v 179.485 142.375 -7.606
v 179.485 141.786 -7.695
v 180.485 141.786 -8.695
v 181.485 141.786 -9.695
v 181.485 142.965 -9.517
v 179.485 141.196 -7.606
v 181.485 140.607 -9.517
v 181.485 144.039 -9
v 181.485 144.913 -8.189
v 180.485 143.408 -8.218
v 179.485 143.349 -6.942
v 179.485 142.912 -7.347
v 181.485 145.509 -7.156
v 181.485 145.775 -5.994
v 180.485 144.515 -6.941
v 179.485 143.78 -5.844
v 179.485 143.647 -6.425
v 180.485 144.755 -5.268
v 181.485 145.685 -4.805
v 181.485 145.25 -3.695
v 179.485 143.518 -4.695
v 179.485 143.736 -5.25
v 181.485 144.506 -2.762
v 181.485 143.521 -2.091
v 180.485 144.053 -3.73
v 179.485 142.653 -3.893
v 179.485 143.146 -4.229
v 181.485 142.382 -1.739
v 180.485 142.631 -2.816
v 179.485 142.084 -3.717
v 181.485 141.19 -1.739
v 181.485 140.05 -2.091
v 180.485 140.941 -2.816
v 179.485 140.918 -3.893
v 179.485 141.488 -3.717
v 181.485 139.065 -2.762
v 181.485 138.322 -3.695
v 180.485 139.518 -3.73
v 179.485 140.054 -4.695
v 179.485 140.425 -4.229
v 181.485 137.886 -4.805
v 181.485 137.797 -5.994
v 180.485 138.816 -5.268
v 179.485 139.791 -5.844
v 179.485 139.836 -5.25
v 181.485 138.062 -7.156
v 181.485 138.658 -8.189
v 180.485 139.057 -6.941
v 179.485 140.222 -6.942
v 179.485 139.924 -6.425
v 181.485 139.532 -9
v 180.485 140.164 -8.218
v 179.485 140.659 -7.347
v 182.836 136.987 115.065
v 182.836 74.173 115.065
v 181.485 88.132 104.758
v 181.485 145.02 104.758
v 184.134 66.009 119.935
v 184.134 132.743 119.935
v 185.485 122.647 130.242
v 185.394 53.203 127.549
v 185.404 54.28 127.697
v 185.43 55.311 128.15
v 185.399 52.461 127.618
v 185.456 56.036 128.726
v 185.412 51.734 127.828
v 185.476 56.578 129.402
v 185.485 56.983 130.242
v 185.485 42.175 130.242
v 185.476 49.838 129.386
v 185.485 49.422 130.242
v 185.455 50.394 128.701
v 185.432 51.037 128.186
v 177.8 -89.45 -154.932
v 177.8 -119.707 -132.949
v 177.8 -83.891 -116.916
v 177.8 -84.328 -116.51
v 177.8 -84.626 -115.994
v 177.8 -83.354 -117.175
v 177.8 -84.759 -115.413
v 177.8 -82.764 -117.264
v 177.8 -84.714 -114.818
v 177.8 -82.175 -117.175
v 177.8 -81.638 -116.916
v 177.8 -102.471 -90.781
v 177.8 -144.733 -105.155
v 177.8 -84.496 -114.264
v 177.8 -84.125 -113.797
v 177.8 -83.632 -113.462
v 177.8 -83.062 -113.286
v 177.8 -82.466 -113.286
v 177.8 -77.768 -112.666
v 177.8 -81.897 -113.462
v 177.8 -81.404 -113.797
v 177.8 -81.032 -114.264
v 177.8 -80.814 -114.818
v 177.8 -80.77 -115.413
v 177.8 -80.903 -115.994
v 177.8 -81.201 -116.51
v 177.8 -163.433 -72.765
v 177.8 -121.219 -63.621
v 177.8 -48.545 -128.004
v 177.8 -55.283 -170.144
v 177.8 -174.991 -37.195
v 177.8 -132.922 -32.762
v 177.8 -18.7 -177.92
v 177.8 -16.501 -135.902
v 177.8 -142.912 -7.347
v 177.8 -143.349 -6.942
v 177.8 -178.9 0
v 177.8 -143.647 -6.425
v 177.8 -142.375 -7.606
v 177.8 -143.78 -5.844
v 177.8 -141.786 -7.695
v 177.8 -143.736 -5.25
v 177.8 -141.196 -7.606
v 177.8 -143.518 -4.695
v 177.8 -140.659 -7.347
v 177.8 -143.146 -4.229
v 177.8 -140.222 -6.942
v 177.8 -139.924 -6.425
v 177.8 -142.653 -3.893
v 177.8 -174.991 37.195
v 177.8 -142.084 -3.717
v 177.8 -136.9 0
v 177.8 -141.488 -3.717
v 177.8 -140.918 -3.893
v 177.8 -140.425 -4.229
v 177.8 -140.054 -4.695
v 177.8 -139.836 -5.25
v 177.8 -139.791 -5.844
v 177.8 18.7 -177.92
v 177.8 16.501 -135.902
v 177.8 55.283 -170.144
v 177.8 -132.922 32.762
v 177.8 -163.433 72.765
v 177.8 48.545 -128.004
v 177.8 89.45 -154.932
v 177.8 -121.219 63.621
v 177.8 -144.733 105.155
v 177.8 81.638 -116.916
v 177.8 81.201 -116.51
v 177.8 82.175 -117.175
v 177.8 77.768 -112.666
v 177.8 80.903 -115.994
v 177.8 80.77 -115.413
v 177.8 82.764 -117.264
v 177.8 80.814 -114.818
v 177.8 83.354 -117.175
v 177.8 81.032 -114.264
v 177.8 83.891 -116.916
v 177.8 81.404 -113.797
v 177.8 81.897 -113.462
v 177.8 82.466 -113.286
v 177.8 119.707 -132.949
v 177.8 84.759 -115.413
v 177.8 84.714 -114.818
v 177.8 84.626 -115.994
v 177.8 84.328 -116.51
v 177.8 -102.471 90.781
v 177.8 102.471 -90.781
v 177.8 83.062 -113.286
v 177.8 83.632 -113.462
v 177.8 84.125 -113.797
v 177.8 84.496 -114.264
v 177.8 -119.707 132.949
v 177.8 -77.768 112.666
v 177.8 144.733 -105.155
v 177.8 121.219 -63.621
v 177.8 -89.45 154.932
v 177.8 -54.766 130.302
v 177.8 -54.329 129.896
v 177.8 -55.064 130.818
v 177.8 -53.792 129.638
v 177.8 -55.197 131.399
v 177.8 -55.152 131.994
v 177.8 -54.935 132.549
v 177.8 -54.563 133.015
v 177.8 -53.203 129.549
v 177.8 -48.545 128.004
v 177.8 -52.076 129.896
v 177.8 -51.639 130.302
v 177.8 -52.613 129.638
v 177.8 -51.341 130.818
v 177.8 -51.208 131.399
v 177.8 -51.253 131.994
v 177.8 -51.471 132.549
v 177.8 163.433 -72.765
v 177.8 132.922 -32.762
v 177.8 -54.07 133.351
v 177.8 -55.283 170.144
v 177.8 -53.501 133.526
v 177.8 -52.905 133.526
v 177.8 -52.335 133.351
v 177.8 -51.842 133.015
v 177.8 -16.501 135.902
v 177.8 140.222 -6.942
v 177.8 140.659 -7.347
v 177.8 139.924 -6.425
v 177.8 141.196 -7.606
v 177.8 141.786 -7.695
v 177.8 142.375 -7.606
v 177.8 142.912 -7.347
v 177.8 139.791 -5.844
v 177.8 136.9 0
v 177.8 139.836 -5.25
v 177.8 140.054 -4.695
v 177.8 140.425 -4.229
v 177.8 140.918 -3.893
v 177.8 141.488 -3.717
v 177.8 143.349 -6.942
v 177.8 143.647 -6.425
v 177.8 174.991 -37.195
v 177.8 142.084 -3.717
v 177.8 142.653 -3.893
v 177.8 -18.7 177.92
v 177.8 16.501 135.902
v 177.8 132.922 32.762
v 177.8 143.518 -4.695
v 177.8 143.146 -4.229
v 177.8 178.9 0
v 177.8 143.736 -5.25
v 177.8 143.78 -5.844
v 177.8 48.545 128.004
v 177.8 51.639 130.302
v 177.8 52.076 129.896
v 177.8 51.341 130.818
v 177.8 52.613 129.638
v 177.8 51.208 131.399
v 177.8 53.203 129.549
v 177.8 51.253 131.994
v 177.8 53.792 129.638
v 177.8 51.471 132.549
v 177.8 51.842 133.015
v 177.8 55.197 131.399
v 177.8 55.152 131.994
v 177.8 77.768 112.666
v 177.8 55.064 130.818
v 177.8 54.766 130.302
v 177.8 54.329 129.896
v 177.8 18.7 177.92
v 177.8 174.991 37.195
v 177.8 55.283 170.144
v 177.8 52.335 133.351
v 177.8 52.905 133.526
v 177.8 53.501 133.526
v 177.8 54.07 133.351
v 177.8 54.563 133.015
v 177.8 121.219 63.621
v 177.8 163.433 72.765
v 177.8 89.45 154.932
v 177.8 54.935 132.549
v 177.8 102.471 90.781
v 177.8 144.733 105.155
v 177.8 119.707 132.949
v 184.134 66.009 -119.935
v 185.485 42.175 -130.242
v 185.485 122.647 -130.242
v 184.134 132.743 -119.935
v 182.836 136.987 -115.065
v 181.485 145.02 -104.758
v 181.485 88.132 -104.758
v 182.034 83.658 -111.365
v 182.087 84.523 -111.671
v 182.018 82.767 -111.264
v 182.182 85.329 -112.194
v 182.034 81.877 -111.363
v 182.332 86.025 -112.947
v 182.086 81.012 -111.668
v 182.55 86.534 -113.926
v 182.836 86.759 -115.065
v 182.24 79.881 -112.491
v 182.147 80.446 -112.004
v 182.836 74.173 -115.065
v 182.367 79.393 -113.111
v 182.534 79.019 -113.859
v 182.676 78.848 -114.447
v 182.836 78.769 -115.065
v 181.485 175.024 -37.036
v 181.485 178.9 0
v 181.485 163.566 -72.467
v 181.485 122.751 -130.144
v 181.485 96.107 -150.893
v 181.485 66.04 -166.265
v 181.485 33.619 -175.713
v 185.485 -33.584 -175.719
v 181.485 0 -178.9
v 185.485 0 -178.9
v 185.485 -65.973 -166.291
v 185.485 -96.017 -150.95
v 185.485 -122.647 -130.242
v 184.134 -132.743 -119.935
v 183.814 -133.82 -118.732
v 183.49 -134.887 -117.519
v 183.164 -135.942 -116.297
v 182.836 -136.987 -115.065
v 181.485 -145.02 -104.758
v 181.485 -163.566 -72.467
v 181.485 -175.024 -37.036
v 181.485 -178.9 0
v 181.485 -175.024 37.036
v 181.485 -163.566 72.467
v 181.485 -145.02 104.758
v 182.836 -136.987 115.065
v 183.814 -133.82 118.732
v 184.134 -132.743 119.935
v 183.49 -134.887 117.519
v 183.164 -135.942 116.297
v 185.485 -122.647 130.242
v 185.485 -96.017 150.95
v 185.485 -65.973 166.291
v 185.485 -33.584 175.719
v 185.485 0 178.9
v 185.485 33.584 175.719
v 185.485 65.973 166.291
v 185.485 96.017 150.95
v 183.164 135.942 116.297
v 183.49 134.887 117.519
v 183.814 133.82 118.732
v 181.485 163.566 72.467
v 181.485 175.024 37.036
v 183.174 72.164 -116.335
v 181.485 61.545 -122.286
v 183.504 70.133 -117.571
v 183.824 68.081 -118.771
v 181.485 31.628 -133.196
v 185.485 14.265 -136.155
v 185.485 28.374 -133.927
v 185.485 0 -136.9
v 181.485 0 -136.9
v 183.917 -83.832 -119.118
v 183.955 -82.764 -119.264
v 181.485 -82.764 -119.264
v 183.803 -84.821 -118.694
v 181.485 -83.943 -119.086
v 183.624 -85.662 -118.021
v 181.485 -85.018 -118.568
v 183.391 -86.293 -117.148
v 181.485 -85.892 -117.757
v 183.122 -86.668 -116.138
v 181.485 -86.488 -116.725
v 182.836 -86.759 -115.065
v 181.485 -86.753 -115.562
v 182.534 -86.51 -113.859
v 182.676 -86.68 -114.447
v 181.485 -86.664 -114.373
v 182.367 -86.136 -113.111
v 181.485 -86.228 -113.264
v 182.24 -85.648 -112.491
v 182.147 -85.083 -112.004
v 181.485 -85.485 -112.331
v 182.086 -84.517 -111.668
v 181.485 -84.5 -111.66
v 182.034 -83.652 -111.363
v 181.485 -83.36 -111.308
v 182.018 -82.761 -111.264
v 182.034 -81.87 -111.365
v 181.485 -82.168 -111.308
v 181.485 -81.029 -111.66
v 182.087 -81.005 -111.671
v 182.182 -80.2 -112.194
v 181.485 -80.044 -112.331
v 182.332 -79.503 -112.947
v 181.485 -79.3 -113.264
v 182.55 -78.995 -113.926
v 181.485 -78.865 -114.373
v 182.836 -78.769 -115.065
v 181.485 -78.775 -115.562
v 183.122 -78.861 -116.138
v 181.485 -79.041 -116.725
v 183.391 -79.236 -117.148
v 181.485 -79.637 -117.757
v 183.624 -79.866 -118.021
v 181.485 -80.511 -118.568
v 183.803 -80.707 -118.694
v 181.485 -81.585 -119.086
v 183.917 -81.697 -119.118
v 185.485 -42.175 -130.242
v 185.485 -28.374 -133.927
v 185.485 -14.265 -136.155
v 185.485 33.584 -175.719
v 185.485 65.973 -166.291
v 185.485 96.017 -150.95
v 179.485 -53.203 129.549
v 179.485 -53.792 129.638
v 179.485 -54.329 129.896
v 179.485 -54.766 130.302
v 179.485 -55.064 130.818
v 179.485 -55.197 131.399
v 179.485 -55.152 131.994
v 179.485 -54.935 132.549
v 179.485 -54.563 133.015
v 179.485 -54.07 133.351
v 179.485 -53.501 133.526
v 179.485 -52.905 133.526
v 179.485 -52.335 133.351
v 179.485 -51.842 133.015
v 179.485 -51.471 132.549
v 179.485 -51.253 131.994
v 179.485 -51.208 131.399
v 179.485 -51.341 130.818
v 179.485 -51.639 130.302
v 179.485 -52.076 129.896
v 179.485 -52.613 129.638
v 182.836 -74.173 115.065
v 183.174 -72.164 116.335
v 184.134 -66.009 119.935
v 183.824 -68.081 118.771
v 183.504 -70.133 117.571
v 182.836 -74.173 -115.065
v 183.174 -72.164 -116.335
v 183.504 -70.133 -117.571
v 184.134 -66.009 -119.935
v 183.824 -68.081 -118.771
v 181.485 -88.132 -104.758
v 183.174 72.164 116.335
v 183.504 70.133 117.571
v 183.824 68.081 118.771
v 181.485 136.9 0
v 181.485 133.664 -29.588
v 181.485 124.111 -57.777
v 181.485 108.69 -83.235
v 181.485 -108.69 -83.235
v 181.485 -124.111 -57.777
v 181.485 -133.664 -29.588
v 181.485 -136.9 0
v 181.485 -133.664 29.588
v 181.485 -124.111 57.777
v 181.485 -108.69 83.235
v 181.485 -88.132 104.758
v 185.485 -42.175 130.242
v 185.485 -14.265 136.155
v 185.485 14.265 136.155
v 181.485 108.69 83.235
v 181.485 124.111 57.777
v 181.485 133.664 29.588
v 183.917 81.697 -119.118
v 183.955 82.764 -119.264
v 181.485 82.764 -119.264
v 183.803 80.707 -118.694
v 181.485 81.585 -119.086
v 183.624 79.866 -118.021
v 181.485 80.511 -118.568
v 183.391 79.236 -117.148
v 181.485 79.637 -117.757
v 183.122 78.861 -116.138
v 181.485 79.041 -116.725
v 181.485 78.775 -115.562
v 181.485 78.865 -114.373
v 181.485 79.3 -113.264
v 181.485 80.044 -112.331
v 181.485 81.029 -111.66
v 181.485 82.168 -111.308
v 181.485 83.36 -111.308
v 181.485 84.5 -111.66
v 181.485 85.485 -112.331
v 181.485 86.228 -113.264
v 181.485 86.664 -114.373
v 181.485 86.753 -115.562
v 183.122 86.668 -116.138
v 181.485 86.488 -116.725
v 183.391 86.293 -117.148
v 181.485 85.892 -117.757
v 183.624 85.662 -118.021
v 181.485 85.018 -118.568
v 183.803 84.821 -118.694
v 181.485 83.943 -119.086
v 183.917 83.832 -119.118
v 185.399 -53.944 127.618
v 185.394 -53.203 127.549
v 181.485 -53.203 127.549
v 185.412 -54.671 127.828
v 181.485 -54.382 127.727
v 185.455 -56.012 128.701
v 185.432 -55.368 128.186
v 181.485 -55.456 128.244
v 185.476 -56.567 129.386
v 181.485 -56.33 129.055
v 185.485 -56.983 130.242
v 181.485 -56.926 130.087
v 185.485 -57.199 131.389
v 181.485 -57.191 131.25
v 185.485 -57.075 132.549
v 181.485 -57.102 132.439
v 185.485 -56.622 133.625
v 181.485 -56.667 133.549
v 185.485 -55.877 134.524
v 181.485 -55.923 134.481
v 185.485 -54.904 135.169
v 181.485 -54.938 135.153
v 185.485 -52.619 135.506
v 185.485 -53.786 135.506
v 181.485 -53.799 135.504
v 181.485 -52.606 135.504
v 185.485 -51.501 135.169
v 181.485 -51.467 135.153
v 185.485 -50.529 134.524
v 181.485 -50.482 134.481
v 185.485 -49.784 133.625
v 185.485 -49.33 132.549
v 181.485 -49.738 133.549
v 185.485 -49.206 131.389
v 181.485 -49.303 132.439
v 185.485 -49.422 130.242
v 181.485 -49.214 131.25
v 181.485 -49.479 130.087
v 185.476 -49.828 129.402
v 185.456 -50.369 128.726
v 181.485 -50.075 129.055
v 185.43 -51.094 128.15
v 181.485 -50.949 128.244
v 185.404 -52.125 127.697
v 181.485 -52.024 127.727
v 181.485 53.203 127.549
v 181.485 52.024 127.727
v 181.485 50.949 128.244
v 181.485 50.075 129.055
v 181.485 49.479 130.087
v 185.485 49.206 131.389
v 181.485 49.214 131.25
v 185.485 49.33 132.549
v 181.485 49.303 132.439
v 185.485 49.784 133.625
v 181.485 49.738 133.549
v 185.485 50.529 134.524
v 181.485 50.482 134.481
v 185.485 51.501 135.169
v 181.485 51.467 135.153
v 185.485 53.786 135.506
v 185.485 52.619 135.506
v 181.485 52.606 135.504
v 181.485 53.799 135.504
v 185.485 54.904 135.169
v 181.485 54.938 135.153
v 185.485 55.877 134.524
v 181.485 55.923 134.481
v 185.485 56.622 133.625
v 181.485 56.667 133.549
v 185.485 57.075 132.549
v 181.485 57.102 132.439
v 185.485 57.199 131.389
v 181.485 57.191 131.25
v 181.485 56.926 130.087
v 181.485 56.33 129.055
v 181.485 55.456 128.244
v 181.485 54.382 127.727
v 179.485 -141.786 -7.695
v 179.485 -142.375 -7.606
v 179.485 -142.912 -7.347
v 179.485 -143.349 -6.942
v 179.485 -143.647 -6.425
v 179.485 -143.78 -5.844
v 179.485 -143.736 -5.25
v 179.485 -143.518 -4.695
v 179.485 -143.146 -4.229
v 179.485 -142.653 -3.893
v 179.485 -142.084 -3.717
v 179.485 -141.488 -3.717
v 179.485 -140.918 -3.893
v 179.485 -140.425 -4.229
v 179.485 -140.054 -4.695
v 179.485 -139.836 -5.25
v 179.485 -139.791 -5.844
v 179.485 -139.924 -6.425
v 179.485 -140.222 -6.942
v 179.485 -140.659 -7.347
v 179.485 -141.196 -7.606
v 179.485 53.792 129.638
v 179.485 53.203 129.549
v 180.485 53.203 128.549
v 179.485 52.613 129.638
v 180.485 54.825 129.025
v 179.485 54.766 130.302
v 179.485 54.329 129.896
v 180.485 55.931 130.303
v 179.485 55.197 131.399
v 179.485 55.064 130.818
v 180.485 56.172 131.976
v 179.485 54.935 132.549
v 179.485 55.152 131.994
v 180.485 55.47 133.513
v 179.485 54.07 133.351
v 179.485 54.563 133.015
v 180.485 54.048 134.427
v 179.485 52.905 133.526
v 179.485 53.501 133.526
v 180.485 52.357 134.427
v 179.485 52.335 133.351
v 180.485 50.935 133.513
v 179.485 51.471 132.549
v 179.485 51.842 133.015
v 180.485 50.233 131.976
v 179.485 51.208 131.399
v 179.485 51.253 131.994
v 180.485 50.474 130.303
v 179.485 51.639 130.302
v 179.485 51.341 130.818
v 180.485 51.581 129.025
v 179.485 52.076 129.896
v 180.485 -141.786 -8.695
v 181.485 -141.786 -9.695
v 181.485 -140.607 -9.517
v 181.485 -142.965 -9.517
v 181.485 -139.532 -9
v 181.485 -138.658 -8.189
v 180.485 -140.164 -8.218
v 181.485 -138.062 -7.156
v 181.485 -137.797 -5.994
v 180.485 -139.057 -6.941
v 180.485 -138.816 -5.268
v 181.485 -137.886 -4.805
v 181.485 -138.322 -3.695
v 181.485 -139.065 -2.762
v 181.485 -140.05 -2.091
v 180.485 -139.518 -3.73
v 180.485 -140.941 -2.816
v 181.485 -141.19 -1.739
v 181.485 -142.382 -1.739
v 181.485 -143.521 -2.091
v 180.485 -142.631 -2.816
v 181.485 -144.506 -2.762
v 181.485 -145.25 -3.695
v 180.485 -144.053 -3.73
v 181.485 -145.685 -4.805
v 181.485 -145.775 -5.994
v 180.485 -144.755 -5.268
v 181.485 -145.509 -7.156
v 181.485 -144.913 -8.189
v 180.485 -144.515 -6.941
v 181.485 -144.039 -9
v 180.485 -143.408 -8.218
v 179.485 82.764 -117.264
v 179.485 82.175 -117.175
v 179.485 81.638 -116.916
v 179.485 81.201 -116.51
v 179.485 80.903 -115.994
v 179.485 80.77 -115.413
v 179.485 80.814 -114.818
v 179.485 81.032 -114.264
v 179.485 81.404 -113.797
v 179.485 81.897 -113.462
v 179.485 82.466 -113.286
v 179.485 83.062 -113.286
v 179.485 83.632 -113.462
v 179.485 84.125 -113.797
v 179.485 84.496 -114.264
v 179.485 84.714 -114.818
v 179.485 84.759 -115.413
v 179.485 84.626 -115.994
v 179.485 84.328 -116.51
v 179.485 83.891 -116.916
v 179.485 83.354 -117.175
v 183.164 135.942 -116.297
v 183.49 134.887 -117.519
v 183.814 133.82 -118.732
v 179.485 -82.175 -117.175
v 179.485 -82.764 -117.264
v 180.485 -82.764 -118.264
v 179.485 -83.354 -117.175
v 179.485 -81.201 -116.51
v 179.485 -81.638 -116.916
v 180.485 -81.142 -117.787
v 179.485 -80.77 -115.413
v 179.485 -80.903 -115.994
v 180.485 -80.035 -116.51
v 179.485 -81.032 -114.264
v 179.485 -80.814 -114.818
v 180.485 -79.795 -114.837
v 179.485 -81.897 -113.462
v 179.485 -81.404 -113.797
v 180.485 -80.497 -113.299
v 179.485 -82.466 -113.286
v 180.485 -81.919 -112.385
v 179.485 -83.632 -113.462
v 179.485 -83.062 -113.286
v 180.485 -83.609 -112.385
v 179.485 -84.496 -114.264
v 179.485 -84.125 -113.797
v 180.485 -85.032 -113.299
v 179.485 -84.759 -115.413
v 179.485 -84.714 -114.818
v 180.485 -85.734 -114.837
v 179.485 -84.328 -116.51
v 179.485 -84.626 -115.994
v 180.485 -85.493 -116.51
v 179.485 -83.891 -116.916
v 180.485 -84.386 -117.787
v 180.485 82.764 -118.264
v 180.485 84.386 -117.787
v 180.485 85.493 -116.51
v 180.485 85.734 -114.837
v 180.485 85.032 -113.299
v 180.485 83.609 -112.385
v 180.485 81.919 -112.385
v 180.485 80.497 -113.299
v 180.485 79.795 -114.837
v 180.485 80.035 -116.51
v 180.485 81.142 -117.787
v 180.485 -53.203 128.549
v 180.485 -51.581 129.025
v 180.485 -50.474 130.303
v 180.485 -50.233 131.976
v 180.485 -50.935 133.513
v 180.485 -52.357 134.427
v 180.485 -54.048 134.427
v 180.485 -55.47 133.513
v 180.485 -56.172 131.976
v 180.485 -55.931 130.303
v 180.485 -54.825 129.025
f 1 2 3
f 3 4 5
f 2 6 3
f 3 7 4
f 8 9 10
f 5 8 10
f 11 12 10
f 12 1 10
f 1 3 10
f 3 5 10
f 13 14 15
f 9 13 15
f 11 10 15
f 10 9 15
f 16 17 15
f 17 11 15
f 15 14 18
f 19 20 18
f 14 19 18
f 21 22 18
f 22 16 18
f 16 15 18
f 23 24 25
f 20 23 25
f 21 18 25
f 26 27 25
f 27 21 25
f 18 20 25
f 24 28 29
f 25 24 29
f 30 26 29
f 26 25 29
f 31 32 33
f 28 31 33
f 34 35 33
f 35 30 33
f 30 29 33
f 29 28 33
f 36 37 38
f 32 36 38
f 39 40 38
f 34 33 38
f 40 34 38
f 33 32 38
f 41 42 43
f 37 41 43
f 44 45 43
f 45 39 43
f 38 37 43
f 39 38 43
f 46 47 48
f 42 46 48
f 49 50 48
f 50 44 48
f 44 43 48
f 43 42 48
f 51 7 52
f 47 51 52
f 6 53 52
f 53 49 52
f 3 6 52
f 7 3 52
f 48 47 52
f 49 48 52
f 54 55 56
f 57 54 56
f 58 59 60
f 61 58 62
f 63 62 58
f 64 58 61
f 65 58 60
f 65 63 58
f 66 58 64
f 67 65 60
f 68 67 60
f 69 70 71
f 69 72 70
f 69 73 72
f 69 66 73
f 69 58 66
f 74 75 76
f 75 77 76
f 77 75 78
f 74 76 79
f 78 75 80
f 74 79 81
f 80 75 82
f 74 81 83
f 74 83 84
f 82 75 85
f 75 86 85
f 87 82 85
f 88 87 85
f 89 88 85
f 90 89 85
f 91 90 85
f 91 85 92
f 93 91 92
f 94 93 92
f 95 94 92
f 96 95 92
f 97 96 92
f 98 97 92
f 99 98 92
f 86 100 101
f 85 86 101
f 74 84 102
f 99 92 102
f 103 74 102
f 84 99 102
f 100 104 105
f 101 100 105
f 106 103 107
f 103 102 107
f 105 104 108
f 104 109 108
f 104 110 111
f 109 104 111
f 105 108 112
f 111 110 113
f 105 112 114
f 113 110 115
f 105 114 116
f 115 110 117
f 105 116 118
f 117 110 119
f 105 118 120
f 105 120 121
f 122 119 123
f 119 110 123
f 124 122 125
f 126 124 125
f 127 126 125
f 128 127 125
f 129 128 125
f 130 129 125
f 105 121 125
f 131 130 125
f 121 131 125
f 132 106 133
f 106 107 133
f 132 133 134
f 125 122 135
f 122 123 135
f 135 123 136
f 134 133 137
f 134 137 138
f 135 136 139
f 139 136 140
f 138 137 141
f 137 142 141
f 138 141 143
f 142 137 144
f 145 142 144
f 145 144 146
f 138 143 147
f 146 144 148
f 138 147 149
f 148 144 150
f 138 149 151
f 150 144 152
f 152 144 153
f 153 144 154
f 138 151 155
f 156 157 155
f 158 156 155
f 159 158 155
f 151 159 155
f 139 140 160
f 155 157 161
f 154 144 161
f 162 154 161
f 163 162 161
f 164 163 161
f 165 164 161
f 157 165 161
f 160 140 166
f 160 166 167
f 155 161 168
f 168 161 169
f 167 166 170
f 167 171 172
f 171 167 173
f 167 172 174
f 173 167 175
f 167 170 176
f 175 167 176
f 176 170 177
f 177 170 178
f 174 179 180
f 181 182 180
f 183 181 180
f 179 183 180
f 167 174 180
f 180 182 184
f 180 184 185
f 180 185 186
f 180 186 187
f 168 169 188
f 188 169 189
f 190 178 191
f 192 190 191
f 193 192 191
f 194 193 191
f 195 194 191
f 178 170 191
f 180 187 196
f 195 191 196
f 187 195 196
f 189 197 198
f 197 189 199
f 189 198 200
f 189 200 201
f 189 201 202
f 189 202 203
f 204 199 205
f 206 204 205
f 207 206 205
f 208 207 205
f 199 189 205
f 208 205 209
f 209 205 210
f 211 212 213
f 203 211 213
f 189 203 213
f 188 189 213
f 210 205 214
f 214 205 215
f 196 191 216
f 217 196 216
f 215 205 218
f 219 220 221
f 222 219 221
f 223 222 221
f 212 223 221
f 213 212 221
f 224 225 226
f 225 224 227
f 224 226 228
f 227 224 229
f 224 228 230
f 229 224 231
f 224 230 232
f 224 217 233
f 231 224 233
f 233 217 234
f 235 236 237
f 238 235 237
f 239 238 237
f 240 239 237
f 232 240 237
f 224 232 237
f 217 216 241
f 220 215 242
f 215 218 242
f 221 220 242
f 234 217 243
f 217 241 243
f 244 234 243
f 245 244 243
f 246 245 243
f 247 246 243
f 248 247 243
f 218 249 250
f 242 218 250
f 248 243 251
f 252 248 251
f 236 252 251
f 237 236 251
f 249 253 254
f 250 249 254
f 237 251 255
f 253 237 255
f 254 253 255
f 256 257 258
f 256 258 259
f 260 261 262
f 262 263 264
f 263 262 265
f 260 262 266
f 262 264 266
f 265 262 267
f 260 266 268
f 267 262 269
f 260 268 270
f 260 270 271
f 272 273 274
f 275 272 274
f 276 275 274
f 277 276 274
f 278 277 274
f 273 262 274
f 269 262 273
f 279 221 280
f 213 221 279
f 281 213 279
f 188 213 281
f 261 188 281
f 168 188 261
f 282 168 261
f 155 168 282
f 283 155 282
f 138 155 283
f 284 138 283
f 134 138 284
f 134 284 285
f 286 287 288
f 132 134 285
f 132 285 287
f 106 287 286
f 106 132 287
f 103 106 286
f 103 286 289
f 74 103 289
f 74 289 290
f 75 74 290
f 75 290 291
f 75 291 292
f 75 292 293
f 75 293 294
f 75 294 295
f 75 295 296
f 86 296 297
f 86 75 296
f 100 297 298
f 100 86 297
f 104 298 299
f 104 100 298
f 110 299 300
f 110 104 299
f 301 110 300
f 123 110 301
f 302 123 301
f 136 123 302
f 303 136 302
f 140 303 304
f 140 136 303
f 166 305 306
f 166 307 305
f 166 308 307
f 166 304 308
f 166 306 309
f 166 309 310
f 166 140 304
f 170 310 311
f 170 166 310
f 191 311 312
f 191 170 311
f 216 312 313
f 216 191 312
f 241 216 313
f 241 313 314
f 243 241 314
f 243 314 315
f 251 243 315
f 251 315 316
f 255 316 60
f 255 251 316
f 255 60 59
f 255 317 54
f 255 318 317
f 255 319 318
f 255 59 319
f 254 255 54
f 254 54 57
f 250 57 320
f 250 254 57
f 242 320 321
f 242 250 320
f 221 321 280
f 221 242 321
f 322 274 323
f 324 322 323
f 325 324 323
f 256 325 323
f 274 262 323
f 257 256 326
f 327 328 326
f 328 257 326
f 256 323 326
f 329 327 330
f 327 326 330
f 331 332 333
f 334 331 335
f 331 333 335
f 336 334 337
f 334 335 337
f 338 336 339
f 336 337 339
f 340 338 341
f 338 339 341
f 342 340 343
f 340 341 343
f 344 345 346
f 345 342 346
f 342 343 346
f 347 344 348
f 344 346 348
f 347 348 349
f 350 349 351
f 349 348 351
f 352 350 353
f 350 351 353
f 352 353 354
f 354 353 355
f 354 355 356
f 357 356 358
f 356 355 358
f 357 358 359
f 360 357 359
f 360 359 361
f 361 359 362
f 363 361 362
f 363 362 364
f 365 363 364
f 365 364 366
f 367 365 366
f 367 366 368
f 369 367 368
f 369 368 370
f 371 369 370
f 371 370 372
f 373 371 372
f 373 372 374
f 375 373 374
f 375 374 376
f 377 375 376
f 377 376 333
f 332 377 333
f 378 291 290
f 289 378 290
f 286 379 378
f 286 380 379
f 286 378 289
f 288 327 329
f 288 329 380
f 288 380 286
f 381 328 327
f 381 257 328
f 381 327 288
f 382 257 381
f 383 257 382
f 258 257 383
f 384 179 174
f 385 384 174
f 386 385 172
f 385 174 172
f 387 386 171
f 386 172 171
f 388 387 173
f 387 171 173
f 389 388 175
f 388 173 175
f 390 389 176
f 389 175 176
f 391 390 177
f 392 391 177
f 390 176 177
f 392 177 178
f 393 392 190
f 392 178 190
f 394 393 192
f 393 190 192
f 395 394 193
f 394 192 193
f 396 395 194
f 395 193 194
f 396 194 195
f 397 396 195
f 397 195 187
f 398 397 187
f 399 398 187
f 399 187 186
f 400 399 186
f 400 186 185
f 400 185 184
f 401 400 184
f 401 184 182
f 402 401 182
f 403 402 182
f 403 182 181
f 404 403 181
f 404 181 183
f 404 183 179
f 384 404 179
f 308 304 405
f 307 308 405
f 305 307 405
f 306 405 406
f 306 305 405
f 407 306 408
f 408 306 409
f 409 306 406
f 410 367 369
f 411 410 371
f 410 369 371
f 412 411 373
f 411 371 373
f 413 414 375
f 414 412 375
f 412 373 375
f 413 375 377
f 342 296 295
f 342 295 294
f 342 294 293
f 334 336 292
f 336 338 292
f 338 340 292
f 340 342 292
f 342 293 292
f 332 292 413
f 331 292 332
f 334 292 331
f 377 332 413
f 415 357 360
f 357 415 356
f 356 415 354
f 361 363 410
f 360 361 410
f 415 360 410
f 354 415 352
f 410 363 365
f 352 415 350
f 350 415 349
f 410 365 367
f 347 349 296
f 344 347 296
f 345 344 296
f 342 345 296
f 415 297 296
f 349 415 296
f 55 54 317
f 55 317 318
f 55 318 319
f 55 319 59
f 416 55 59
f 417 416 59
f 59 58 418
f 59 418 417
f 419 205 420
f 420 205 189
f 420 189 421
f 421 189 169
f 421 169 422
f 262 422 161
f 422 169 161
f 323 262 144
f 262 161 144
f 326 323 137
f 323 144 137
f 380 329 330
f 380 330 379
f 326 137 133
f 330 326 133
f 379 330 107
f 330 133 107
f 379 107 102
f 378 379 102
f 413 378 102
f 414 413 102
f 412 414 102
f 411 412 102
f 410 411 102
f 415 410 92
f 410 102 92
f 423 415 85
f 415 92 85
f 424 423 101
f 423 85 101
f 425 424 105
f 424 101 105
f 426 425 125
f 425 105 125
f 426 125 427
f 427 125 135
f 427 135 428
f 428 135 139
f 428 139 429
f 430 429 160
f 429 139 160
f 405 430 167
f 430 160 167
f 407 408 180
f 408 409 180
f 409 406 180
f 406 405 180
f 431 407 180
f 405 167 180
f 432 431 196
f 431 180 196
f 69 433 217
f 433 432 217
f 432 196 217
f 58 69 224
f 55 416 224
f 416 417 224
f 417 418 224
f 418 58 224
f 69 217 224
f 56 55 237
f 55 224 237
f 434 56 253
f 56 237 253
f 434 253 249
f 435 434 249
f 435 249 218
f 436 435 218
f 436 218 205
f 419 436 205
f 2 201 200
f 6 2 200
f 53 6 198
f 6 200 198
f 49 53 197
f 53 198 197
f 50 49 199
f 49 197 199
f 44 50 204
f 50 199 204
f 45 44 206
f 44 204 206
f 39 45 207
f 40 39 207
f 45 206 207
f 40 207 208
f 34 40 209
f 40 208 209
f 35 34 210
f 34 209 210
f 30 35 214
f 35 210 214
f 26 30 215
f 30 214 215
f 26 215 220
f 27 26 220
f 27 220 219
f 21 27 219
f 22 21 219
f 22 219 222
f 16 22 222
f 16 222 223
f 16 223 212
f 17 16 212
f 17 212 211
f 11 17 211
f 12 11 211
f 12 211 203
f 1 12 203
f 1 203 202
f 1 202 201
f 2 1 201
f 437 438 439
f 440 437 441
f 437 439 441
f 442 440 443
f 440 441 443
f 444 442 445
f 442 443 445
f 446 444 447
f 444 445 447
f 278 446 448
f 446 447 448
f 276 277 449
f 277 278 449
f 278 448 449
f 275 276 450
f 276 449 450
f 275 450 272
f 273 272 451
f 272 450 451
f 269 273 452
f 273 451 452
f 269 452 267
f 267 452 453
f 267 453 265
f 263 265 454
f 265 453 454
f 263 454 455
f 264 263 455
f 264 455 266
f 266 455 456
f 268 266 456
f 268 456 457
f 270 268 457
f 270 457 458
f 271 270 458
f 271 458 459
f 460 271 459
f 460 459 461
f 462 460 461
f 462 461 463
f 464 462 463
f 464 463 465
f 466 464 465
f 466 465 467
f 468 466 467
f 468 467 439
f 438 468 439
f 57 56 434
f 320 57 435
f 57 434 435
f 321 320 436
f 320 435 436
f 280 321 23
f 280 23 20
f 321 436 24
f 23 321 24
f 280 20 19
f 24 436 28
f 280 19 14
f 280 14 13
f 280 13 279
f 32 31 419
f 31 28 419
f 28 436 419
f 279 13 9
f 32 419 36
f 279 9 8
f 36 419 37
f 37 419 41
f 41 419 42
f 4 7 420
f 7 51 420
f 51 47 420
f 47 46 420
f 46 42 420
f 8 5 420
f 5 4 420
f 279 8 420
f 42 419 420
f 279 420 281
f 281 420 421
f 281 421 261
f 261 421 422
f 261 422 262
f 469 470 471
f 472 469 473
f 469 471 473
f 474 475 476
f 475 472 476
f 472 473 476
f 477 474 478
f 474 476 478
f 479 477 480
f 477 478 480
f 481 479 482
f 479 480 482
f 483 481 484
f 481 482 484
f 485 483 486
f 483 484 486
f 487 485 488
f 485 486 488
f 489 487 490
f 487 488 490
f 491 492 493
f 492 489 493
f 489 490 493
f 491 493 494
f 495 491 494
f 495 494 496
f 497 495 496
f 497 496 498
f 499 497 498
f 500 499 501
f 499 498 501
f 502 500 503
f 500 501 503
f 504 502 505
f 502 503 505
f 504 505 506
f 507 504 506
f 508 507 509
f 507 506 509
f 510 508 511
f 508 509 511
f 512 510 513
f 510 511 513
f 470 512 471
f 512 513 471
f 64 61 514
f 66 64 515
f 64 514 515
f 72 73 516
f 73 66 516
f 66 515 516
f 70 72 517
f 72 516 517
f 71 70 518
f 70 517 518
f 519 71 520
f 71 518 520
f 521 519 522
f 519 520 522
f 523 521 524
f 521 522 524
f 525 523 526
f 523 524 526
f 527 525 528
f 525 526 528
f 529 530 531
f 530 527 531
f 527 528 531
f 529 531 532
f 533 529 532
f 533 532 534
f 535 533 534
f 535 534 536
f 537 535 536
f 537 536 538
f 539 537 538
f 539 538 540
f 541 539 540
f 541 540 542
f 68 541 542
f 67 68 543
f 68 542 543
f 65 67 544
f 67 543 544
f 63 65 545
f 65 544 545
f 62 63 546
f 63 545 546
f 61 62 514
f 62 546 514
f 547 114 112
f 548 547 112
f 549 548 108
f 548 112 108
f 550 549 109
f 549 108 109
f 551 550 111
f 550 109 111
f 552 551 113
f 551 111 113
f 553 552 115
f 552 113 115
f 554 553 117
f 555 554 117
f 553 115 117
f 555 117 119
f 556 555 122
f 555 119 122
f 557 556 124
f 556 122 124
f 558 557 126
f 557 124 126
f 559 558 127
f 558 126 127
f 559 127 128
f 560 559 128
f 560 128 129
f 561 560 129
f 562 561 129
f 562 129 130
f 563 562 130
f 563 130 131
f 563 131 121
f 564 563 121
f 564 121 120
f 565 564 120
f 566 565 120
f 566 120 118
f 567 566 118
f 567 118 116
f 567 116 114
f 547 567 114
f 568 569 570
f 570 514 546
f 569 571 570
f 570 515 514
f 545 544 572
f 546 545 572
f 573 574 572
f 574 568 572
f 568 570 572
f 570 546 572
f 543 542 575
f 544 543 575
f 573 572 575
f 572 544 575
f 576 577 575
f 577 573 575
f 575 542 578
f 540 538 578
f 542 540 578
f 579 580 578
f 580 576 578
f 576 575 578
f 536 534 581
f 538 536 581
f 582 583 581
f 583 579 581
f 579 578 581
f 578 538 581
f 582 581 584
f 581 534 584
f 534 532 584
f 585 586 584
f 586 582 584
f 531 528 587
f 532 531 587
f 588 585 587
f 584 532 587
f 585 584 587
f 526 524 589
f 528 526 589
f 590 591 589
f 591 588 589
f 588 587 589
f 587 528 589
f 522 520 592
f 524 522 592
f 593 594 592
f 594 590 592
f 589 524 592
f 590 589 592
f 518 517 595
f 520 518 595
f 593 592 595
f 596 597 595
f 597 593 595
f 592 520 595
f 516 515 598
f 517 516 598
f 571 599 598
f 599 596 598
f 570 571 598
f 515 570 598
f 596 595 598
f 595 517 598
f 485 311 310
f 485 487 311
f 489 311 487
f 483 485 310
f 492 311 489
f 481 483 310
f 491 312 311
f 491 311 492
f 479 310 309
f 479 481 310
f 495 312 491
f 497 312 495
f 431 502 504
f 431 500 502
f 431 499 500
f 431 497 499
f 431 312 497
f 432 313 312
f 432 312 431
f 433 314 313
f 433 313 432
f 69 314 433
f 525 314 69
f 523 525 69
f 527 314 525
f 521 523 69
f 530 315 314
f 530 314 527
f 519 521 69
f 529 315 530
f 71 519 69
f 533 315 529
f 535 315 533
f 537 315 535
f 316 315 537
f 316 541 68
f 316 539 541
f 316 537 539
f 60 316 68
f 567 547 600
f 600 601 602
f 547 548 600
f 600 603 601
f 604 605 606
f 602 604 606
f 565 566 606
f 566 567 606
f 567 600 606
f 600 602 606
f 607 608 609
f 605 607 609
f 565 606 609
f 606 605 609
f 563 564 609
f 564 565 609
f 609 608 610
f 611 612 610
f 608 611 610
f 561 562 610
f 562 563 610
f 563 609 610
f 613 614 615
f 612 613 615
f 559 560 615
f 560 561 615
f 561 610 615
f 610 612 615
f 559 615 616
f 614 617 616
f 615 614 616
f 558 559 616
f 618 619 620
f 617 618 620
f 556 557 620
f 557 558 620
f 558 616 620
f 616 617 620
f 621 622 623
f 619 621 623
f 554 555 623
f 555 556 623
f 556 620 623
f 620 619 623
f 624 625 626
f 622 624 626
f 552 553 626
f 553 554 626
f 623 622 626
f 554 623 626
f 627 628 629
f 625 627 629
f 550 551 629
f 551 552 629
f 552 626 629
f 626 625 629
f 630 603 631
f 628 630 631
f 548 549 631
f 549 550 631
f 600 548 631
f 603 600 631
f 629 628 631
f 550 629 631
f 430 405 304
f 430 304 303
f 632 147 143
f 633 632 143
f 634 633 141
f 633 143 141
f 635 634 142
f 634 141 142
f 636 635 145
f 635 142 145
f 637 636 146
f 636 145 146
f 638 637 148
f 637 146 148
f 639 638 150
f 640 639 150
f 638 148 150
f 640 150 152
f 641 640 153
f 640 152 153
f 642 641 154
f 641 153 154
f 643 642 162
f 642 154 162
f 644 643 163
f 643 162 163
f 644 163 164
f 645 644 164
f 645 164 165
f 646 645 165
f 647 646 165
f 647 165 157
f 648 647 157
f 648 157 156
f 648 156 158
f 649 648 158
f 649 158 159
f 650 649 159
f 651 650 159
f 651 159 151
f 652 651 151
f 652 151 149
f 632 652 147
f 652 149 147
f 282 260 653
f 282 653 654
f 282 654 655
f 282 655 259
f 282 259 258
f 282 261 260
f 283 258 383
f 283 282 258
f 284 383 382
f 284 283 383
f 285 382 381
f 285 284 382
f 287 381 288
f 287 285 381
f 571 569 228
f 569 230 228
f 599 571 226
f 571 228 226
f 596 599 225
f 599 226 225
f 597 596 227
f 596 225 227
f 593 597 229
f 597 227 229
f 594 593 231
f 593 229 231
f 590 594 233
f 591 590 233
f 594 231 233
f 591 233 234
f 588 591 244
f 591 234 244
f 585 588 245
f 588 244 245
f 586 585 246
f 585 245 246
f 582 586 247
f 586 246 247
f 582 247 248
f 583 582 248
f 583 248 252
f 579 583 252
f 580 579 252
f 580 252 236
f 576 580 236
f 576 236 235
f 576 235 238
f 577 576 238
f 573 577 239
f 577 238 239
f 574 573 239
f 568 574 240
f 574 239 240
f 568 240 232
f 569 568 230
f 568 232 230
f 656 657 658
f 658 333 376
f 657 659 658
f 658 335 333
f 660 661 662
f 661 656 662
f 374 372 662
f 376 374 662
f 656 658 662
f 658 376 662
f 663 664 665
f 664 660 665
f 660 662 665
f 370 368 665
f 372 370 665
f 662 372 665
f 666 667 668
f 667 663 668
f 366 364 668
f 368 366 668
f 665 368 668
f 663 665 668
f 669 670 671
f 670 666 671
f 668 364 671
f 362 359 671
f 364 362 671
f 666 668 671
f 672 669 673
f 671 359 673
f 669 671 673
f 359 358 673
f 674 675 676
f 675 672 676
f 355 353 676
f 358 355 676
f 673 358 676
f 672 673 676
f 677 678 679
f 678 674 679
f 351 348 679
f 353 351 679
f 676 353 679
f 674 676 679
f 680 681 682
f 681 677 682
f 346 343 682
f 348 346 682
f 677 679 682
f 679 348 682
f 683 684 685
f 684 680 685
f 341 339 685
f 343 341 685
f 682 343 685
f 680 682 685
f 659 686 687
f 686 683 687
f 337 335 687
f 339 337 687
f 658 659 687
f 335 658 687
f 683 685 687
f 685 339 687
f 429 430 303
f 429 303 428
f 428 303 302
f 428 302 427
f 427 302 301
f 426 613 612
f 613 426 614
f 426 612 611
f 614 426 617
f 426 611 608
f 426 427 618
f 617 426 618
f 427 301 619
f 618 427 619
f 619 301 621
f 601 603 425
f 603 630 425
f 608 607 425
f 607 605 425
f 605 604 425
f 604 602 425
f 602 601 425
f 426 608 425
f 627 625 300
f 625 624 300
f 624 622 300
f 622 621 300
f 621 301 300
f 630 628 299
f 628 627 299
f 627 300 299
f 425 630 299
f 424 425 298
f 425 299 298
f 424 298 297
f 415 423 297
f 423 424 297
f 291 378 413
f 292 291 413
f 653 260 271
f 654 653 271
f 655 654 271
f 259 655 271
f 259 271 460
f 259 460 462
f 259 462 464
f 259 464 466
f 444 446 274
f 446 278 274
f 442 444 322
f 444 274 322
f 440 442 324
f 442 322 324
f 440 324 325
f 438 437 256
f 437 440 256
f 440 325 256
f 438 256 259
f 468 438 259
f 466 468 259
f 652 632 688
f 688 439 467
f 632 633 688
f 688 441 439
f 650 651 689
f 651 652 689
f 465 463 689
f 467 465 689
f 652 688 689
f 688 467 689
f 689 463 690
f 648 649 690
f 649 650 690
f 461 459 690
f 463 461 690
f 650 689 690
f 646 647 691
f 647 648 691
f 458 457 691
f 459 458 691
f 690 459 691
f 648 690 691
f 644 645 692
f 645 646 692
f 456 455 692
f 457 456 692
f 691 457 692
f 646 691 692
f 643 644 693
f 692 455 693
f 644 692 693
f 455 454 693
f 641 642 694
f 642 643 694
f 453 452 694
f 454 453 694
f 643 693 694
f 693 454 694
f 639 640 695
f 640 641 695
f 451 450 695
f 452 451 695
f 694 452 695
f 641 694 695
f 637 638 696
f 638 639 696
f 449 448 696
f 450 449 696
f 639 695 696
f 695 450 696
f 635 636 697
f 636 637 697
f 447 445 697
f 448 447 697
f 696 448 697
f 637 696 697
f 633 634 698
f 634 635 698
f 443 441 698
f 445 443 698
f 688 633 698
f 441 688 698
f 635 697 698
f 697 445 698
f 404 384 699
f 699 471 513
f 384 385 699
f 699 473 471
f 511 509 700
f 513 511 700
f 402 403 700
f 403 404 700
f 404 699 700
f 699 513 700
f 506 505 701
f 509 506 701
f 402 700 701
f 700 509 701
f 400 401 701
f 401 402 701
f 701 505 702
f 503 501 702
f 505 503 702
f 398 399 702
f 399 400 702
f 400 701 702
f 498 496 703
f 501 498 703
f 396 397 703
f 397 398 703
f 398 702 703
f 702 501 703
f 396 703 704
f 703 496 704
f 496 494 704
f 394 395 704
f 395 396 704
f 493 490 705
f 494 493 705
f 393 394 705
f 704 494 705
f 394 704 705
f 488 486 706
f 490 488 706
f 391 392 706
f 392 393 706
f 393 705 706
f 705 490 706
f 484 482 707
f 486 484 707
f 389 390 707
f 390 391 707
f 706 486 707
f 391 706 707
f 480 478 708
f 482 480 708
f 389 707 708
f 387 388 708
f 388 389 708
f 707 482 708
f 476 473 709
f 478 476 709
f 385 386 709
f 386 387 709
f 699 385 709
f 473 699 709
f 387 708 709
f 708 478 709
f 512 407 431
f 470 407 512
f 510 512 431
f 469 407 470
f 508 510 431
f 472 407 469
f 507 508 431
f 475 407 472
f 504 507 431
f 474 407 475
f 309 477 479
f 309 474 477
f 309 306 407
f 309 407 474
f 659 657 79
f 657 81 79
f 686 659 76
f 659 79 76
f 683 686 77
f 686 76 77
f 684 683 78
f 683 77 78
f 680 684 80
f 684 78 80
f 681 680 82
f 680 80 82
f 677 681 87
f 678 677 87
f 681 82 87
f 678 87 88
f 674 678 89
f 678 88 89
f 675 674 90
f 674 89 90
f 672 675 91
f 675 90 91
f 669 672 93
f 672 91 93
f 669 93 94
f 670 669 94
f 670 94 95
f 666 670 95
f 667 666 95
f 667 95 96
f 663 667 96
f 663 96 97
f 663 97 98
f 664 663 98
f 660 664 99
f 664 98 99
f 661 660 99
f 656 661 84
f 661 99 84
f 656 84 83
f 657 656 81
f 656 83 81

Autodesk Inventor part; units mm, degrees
ref_plane "XY Plane" through (0, 0, 0) normal (0, 0, 1) x (1, 0, 0)
ref_plane "Work Plane1" through (177.8, 0, 0) normal (1, 0, 0) x (0, 1, 0)
sketch "Sketch1" plane through (177.8, 0, 0) normal (1, 0, 0) x (0, 1, 0)
  circle A0 centre (0, 0) radius 178.9
  circle A1 centre (0, 0) radius 136.9
  dimension "d1" = 357.8
  dimension "d2" = 273.8
extrude "Extrusion1" add sketch "Sketch1" along normal blind 3.685
sketch "Sketch2" plane through (181.485, 0, 0) normal (1, 0, 0) x (0, 0, -1)
  line L0 (250.46, 0) -> (-250.46, 0) construction
  line L1 (0, -250.46) -> (0, 250.46) construction
  circle A0 centre (0, 0) radius 141.9 construction
  line L2 (0, 0) -> (-131.5488, 53.2026) construction
  line L3 (0, 0) -> (5.6947, 141.7857) construction
  line L4 (0, 0) -> (115.2635, 82.7643) construction
  point P0 (-131.5488, -53.2026)
  point P1 (5.6947, -141.7857)
  point P2 (115.2635, -82.7643)
  dimension "d5" = 283.8
  dimension "d6" = 22.02
  dimension "d7" = 92.3
  dimension "d8" = 144.32
hole "Hole1" at (181.485, 53.2026, 131.5488) at (181.485, 141.7857, -5.6947) at (181.485, 82.7643, -115.2635) at (181.485, -53.2026, 131.5488) at (181.485, -141.7857, -5.6947) at (181.485, -82.7643, -115.2635) direction (-1, 0, 0) diameter 4 end through all countersink diameter 8 countersink angle 90
sketch "Sketch3" plane through (181.485, 0, 0) normal (1, 0, 0) x (0, 0, -1)
  circle A0 centre (5.6947, -141.7857) radius 4 projected
  circle A1 centre (115.2635, 82.7643) radius 4 projected
  circle A2 centre (-131.5488, 53.2026) radius 4 projected
  circle A3 centre (5.6947, 141.7857) radius 4 projected
  circle A4 centre (-131.5488, -53.2026) radius 4 projected
  circle A5 centre (115.2635, -82.7643) radius 4 projected
  circle A6 centre (0, 0) radius 136.9 projected
  circle A7 centre (0, 0) radius 178.9 projected
extrude "Extrusion2" add sketch "Sketch3" along normal blind 4
sketch "Sketch4" plane through (0, 0, 0) normal (0, 1, 0) x (-1, 0, 0)
  line L0 (-185.485, 178.9) -> (-185.485, -178.9) construction
  line L1 (-177.8, -178.9) -> (-177.8, 178.9) construction
  line L2 (44.297, 0) -> (-265.782, 0) construction
  line L3 (-181.485, 0) -> (-181.485, 104.7583) construction
  line L4 (-185.485, 0) -> (-185.485, 125) construction
  line L5 (-182.8356, 115.0648) -> (-184.1344, 119.9352) construction
  arc A0 (-181.485, 104.7583) -> (-182.8356, 115.0648) centre (-221.485, 104.7583) ccw
  line L6 (-185.485, 130.2417) -> (-185.485, 178.9) construction
  arc A1 (-185.485, 130.2417) -> (-184.1344, 119.9352) centre (-145.485, 130.2417) ccw
  line L7 (-182.8356, 115.0648) -> (-184.1344, 119.9352)
  line L8 (-182.8356, -115.0648) -> (-184.1344, -119.9352) construction
  arc A2 (-182.8356, -115.0648) -> (-181.485, -104.7583) centre (-221.485, -104.7583) ccw
  arc A3 (-184.1344, -119.9352) -> (-185.485, -130.2417) centre (-145.485, -130.2417) ccw
  line L9 (-182.8356, -115.0648) -> (-184.1344, -119.9352)
  line L10 (-181.485, 104.7583) -> (-181.485, -104.7583)
  line L11 (-185.485, -130.2417) -> (-185.485, 130.2417)
  line L12 (-185.485, 127.5488) -> (-185.485, 135.5488) projected
  point P0 (0, 0)
  point P1 (-181.485, 110)
  dimension "d18" = 4
  dimension "d19" = 125
  dimension "d20" = 110
  dimension "d21" = 40
  dimension "d22" = 40
extrude "Extrusion3" cut sketch "Sketch4" along normal through all both and the other way through all
equation "\"d1\" = gxfront_OD"
equation "\"d2\" = gxfront_ID"
equation "\"d3\" = gxfront_t_total"
equation "\"d5\" = gxfront_d_holpos"
equation "\"d6\" = gxfront_a_hol_1"
equation "\"d7\" = gxfront_a_hol_2"
equation "\"d8\" = gxfront_a_hol_3"
equation "\"d9\" = gxfront_d_hol"
equation "\"d11\" = gxfront_d_holcs"
equation "\"d16\" = gxfront_t_extra"
equation "\"d18\" = gxfront_t_extra"
equation "\"d19\" = gxfront_z_extra"
equation "\"d20\" = gxfront_z_flat"
equation "\"d21\" = gxfront_rfillet_zfair"
equation "\"d22\" = gxfront_rfillet_zfair"
equation "\"d23\" = gxfront_t_extra"
equation "\"gxfront_ID\" = 273.8"
equation "\"gxfront_OD\" = 357.8"
equation "\"gxfront_xbot\" = 177.8"
equation "\"gxfront_tbase\" = 1"
equation "\"gxfront_w_wire\" = 1.074"
equation "\"gxfront_t_total\" = 3.685"
equation "\"gxfront_d_holpos\" = 283.8"
equation "\"gxfront_d_hol\" = 4"
equation "\"gxfront_a_hol_1\" = 22.02deg"
equation "\"gxfront_a_hol_2\" = 92.3deg"
equation "\"gxfront_a_hol_3\" = 144.32deg"
equation "\"d0\" = gxfront_xbot"
equation "\"gxfront_d_holcs\" = 8"
equation "\"gxfront_z_extra\" = 125"
equation "\"gxfront_z_flat\" = 110"
equation "\"gxfront_t_extra\" = 4"
equation "\"gxfront_rfillet_zfair\" = 40"
equation "\"gxfront_t_total_offset\" = 0.5"
properties part number "GxFrontplate_base_191210_v02"
